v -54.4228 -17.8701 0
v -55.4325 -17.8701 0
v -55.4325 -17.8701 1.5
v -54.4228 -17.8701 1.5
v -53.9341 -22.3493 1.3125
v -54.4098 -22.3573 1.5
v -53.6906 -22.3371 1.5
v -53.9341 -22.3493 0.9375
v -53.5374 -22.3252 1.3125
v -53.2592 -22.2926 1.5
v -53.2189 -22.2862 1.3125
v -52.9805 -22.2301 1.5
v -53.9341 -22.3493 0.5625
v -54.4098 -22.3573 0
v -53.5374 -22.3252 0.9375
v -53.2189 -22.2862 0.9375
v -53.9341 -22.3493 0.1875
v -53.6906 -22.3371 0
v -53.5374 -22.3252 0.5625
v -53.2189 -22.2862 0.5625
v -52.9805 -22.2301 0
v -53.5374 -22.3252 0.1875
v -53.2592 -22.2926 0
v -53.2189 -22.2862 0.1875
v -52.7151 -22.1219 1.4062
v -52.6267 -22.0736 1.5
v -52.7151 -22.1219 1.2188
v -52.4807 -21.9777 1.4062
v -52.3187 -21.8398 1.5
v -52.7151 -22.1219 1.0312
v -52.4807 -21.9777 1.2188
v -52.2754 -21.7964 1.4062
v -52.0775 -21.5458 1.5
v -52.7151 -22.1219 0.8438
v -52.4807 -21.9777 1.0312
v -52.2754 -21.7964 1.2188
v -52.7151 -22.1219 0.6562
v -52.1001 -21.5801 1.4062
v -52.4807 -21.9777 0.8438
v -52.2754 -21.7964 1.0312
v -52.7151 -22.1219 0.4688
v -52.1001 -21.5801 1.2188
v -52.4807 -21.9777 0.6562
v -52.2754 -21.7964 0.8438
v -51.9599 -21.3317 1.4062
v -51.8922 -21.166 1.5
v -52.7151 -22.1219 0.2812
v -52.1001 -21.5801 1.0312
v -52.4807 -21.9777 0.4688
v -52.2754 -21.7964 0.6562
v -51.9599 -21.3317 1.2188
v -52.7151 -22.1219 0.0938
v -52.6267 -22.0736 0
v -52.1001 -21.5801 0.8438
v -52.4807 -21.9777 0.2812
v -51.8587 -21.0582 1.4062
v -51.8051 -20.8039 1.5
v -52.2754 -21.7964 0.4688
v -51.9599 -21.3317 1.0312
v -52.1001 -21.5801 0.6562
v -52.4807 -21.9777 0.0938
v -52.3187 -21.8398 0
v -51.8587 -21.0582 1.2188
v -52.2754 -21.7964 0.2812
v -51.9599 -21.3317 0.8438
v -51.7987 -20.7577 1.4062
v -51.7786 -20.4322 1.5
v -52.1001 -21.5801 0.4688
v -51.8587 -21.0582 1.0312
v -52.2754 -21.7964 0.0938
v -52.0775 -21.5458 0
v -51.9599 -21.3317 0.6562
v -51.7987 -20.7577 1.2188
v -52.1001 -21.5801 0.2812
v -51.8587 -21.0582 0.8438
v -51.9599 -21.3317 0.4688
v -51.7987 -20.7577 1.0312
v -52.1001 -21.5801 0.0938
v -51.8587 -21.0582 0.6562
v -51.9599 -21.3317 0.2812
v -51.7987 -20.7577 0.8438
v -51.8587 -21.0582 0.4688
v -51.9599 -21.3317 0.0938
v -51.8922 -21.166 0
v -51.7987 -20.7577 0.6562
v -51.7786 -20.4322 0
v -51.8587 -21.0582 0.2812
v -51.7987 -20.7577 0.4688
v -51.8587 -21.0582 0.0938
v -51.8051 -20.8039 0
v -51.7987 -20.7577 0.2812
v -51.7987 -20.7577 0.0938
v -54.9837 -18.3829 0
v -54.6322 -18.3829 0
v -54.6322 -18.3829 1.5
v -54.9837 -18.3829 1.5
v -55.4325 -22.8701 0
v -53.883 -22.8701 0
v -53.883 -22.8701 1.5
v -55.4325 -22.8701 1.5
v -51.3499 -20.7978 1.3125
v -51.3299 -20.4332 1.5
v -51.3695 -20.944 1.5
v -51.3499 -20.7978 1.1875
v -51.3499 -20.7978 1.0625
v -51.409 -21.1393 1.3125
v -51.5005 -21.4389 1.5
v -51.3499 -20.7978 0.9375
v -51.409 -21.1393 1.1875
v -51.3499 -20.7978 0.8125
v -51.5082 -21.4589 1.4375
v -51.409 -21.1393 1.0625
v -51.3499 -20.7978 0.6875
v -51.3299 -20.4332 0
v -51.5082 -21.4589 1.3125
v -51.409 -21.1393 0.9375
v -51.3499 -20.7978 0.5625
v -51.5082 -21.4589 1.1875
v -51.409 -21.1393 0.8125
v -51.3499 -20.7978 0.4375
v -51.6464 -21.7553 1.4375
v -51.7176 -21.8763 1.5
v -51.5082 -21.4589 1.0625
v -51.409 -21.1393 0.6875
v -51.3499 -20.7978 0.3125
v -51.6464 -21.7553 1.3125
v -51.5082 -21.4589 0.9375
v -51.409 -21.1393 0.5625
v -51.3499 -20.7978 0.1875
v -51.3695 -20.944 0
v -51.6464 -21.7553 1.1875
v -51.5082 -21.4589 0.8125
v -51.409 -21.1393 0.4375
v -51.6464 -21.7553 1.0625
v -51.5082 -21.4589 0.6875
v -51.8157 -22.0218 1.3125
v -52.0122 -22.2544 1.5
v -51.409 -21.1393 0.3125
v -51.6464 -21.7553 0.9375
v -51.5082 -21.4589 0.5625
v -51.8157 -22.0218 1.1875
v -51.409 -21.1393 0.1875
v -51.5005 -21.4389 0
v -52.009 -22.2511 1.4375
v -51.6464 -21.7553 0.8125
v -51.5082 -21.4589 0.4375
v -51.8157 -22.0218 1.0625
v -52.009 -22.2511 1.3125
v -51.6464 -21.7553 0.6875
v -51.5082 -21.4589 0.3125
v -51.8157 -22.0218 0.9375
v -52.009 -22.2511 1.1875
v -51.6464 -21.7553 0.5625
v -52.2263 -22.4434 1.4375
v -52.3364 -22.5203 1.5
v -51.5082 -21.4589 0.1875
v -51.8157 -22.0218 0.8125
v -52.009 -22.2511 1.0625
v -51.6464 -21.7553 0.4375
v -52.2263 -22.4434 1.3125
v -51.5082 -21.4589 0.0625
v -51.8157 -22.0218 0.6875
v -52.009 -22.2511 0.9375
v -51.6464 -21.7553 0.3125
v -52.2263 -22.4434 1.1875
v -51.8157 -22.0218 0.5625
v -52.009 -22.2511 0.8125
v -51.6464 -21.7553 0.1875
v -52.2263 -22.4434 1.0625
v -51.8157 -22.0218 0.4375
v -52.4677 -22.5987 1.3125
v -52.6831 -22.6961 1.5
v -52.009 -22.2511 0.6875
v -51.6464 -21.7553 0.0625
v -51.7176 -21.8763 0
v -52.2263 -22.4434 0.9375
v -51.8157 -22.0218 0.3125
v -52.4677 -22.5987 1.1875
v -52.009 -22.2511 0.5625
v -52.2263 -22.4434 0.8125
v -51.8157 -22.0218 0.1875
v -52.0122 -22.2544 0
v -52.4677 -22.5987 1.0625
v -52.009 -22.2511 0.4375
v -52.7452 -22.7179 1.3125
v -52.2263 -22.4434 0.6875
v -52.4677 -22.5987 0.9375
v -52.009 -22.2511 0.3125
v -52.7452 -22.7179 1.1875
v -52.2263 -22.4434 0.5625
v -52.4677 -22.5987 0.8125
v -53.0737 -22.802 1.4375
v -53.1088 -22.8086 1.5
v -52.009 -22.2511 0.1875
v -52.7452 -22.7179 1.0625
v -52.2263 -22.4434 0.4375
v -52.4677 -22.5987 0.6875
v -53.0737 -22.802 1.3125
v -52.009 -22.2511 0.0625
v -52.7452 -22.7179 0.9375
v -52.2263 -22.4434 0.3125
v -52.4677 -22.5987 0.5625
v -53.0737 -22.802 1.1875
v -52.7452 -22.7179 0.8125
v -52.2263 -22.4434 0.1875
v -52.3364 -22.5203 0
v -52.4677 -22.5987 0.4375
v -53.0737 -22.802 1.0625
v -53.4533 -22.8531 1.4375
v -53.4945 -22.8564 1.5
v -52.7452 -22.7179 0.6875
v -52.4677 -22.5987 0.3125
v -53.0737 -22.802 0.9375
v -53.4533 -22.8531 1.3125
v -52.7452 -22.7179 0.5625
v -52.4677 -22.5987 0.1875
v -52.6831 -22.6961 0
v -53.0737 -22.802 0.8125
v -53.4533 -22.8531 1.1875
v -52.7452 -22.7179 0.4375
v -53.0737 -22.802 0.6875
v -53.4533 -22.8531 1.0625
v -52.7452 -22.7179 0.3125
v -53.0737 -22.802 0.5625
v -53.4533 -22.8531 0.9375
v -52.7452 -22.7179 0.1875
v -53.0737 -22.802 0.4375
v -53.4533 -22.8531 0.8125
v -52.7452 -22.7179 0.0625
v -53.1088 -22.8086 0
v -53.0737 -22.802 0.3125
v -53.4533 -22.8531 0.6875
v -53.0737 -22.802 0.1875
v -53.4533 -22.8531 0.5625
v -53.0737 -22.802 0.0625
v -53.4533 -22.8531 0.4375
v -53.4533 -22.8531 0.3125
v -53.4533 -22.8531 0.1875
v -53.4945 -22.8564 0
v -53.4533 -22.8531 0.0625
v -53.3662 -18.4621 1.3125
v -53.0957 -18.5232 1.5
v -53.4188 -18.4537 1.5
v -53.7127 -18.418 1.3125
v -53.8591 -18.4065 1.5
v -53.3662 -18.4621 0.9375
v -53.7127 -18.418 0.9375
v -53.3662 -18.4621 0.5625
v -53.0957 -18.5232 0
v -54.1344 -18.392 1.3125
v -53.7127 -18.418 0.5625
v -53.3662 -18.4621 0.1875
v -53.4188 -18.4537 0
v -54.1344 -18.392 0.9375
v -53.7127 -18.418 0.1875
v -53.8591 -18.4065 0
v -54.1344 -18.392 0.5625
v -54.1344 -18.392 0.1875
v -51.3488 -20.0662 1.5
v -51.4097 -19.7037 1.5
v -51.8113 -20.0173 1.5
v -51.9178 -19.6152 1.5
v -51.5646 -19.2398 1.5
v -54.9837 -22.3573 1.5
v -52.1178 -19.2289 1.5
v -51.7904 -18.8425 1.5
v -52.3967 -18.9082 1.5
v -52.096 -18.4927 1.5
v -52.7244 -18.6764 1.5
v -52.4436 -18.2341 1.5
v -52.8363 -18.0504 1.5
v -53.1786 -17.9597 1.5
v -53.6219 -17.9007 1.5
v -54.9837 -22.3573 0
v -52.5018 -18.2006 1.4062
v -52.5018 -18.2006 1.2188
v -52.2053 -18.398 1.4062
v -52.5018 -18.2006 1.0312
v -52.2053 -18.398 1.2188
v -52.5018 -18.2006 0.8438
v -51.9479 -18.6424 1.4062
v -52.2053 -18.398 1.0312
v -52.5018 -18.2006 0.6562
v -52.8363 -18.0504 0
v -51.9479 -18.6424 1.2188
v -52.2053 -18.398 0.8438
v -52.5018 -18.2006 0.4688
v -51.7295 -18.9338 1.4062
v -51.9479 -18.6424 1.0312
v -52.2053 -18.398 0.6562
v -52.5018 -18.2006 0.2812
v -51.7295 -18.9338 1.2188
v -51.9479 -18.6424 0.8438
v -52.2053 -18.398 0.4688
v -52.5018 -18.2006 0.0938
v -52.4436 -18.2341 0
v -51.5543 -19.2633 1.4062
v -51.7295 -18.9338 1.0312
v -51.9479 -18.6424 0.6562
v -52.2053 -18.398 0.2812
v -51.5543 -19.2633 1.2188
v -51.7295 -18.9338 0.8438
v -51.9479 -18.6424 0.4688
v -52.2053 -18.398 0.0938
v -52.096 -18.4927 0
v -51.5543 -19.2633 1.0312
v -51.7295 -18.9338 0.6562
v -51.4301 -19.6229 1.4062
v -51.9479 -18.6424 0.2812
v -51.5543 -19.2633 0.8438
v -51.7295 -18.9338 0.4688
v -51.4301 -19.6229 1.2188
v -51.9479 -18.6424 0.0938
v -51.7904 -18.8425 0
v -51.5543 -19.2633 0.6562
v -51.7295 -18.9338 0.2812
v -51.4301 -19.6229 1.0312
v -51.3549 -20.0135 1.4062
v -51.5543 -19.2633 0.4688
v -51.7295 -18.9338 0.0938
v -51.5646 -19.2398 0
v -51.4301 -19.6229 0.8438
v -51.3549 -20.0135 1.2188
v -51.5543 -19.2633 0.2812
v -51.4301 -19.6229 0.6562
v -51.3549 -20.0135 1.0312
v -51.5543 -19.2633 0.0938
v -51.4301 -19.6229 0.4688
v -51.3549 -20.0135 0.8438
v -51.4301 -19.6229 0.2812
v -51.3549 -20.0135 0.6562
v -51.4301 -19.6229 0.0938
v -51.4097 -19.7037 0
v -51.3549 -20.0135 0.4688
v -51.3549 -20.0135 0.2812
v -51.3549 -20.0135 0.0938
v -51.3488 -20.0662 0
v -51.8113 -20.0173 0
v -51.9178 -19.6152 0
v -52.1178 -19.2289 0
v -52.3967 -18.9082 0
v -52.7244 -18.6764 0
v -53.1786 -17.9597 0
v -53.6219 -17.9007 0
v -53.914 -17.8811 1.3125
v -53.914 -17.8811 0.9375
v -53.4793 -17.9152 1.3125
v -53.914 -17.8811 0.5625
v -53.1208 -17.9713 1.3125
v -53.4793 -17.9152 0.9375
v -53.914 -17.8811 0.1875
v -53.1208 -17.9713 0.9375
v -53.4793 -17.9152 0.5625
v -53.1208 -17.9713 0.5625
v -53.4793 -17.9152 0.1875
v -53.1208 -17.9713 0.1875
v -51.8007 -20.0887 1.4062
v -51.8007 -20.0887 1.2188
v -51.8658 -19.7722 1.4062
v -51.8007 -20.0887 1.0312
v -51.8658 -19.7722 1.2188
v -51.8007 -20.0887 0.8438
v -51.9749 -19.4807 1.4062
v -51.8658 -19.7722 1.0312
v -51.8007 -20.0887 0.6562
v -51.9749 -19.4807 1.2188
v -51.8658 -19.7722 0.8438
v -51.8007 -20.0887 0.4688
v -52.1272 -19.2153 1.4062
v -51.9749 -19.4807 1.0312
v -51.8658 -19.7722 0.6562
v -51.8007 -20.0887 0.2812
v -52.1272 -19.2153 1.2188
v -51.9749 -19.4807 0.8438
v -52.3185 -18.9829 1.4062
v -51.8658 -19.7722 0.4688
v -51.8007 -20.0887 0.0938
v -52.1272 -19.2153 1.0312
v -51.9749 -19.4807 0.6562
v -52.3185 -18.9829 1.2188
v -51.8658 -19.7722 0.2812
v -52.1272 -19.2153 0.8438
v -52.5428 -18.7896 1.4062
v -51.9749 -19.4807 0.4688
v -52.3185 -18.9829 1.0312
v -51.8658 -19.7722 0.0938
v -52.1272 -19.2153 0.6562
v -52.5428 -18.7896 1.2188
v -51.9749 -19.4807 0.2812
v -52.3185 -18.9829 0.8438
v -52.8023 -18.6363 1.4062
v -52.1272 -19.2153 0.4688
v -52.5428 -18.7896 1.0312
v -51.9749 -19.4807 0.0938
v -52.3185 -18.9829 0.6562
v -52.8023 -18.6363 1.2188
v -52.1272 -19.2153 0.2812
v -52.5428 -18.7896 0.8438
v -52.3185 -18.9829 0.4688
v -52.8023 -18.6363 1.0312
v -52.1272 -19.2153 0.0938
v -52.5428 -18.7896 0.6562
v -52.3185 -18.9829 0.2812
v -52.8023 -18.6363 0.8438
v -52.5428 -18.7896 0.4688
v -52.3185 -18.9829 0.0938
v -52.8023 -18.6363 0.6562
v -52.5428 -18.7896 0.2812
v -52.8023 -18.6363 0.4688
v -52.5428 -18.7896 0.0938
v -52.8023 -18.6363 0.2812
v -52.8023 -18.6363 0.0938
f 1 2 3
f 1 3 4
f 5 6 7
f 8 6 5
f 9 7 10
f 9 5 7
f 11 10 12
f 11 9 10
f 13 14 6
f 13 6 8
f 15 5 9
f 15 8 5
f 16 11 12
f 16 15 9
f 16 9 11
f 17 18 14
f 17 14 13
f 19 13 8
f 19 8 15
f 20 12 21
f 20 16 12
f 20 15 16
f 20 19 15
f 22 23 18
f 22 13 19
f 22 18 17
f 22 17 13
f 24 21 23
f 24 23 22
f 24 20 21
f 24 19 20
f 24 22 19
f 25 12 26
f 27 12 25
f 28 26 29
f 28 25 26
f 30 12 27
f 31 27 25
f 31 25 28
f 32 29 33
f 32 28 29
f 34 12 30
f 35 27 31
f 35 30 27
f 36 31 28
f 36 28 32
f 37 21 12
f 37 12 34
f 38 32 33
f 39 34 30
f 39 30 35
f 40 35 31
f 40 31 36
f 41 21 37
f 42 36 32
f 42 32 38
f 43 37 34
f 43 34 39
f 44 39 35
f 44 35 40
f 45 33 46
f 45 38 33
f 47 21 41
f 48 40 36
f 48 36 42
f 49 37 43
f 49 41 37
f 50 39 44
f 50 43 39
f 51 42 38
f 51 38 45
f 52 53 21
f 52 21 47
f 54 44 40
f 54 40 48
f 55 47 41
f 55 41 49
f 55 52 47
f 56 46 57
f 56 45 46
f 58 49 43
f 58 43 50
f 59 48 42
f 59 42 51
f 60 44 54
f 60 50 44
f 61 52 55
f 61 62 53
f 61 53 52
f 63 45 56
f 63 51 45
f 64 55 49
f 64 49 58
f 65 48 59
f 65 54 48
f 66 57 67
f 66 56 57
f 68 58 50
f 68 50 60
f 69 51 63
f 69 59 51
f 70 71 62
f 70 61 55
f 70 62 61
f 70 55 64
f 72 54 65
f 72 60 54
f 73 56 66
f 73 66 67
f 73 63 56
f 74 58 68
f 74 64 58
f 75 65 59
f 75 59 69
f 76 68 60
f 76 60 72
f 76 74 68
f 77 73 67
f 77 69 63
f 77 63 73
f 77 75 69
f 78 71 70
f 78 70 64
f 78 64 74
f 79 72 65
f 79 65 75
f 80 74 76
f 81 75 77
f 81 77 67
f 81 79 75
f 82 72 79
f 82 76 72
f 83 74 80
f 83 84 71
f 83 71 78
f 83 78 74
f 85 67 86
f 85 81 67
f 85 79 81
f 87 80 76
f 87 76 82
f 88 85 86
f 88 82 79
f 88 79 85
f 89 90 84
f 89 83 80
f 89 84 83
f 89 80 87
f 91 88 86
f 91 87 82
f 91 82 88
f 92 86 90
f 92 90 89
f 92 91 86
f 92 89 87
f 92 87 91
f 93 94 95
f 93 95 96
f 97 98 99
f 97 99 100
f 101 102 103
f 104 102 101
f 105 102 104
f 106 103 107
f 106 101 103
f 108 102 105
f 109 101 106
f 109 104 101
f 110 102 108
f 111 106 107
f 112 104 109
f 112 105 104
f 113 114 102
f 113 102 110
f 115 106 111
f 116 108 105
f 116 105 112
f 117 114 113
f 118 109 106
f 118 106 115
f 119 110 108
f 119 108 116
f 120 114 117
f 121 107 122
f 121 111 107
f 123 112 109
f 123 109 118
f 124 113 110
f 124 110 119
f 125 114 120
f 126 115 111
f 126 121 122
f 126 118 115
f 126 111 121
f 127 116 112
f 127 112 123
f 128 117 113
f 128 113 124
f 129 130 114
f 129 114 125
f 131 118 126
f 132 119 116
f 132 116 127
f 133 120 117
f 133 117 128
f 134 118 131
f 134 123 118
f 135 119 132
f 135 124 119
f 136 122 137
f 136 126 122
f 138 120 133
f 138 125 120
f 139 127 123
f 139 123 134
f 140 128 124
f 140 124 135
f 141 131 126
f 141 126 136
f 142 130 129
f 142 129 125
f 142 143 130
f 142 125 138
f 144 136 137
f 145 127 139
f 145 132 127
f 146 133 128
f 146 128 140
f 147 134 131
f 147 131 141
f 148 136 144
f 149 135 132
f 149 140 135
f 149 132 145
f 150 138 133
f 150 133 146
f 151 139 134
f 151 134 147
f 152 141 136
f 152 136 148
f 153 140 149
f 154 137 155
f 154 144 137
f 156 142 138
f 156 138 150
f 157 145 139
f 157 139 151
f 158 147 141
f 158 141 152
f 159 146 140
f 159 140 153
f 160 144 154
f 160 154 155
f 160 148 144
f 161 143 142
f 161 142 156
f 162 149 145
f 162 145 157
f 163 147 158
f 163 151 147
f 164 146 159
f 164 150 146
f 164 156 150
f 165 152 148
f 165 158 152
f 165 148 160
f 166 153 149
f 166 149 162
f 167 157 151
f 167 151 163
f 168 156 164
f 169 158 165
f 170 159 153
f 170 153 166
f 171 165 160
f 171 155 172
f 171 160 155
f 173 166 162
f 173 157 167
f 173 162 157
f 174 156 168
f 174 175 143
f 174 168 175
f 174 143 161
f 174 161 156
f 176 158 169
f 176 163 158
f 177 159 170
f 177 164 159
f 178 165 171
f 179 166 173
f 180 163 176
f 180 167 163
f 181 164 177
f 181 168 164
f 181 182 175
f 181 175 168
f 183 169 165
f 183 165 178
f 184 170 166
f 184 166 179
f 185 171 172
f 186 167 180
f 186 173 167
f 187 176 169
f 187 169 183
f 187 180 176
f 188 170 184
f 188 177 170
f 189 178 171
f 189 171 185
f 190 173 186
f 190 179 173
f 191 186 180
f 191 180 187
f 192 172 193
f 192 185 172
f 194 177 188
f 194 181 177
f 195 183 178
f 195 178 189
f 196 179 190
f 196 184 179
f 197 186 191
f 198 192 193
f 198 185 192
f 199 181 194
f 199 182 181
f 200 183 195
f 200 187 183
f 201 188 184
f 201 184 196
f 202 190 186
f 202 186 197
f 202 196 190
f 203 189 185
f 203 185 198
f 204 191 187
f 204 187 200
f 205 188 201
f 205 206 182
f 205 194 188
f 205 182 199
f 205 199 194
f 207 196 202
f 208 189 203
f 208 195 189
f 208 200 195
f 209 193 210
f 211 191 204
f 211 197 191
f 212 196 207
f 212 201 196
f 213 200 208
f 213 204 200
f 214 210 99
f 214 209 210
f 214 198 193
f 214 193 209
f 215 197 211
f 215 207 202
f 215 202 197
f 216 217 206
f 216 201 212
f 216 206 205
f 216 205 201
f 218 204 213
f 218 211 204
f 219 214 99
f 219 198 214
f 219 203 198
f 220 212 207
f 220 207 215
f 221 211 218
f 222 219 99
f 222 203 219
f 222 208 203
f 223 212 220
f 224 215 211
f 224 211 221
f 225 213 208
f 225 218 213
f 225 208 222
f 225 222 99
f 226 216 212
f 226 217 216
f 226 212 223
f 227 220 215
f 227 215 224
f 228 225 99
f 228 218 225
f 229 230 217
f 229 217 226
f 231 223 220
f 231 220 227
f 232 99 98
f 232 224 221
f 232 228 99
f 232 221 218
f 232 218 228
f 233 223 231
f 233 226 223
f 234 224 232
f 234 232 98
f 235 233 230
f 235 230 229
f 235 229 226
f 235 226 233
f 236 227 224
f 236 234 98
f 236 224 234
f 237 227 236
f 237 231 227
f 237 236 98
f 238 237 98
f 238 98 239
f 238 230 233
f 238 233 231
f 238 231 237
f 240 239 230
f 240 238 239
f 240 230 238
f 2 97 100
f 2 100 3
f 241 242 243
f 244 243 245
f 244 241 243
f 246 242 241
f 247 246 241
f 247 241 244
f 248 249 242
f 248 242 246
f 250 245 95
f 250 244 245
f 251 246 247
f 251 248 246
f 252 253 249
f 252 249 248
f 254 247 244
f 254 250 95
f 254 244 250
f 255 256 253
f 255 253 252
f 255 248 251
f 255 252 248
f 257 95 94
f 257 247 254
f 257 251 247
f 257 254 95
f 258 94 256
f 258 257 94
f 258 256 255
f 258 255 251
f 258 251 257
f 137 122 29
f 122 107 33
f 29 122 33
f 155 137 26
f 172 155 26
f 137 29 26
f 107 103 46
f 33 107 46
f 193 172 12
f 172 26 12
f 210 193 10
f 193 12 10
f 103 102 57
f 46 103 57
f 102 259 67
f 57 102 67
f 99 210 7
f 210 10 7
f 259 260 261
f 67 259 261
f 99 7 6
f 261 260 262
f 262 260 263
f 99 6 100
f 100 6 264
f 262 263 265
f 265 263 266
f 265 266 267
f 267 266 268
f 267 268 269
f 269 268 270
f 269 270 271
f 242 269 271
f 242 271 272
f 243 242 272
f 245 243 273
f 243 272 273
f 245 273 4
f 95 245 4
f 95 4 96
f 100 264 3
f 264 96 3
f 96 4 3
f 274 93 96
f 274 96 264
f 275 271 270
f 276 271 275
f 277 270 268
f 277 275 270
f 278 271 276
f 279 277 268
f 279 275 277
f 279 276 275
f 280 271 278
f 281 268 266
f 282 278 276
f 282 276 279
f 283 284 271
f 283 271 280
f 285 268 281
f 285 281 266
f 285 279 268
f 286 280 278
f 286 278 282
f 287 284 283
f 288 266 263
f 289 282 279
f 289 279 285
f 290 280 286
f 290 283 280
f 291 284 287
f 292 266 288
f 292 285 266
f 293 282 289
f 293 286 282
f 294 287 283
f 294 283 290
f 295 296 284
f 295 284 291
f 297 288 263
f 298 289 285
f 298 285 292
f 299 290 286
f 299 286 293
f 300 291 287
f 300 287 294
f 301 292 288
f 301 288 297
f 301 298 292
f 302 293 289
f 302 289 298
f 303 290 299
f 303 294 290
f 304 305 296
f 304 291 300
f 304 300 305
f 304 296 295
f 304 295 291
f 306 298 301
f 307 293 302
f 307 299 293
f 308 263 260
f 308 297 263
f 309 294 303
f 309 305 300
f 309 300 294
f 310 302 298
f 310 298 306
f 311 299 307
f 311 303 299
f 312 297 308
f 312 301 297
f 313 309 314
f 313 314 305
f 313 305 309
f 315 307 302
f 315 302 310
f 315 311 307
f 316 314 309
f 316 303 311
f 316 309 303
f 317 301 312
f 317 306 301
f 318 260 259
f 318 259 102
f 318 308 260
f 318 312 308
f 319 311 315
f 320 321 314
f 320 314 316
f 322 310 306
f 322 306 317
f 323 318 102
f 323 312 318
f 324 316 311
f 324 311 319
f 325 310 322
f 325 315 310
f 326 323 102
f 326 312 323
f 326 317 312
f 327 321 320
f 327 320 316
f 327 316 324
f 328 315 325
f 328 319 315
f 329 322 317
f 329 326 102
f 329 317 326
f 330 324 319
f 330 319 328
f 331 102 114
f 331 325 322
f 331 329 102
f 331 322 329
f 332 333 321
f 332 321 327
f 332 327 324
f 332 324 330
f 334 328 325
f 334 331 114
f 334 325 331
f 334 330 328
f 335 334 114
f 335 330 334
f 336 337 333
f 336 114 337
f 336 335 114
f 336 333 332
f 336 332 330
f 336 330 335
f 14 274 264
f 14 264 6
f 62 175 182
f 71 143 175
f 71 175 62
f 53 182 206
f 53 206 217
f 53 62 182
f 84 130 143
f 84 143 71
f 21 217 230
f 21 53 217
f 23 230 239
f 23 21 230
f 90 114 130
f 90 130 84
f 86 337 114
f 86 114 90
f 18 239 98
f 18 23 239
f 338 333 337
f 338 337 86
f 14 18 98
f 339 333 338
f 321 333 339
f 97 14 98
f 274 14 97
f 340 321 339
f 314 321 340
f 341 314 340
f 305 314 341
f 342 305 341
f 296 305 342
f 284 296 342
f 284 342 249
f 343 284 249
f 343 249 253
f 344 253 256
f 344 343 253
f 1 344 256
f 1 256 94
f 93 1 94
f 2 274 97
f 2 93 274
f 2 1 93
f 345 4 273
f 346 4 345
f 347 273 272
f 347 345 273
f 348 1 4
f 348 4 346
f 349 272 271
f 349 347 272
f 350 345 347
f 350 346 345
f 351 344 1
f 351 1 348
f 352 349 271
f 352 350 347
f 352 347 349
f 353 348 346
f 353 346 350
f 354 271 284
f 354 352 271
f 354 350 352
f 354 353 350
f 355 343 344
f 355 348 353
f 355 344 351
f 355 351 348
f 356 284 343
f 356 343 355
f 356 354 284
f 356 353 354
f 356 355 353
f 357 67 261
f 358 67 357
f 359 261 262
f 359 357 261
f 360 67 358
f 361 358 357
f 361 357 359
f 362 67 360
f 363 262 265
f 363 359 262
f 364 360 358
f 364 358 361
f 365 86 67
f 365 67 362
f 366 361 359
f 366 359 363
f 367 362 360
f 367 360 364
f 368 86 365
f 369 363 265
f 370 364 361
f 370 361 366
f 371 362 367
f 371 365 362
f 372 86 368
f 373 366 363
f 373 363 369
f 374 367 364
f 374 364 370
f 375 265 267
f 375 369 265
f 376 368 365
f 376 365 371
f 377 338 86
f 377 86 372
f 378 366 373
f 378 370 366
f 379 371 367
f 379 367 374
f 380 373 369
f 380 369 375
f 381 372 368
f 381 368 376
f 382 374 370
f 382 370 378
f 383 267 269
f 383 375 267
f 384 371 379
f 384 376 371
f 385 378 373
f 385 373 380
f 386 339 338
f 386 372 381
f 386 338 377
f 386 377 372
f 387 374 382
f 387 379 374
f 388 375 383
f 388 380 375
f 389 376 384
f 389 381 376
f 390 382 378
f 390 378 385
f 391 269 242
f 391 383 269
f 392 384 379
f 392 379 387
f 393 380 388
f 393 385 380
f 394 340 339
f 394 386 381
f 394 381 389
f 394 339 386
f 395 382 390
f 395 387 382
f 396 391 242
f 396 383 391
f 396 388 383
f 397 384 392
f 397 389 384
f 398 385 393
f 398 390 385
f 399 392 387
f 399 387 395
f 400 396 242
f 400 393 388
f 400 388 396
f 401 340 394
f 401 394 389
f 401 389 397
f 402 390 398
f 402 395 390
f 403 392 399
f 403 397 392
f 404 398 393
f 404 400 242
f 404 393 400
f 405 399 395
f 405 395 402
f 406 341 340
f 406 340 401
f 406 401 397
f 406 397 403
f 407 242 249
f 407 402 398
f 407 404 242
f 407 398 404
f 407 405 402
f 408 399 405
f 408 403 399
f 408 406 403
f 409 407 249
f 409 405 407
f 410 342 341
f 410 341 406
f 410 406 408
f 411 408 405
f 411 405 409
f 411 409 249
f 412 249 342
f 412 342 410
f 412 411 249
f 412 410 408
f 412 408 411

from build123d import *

# Parameters (mm, degrees)
BOSS_EXTRU_1_DEPTH = 1.5


with BuildPart() as part:
    # Esquisse1 → Boss.-Extru.1 (new body)
    with BuildSketch(Plane.XY):
        with BuildLine():
            Line((-55.432465326, -22.870119076), (-55.432465326, -17.870119076))
            Line((-55.432465326, -17.870119076), (-54.422849941, -17.870119076))
            add(Edge.make_bspline(
                [(-54.422849941, -17.870119076), (-54.335037101, -17.870751319), (-54.165383151, -17.871972809), (-53.920222511, -17.879717653), (-53.693388565, -17.893418319), (-53.485627338, -17.913374785), (-53.296368463, -17.937879119), (-53.12614188, -17.968593982), (-52.974067391, -18.004862797), (-52.880539618, -18.035784869), (-52.83631148, -18.050407538)],
                knots=[0, 0, 0, 0, 1.314313732, 2.53924729, 3.670748893, 4.714932338, 5.66265055, 6.526160246, 7.303039223, 8, 8, 8, 8], degree=3))
            add(Edge.make_bspline(
                [(-52.83631148, -18.050407538), (-52.778461852, -18.072451403), (-52.664074435, -18.116039252), (-52.501207117, -18.198262539), (-52.34788517, -18.291424113), (-52.203286391, -18.395646774), (-52.070713782, -18.513881558), (-51.944988215, -18.641105966), (-51.831252896, -18.781946452), (-51.727098187, -18.933482149), (-51.633190102, -19.093927938), (-51.551562734, -19.262978093), (-51.483771315, -19.439774105), (-51.427495277, -19.623824316), (-51.383143194, -19.815533427), (-51.352883292, -20.015124664), (-51.332924735, -20.221809221), (-51.330918947, -20.362058455), (-51.329901223, -20.433220038)],
                knots=[0, 0, 0, 0, 0.984719456, 1.947108742, 2.898477687, 3.838006223, 4.779231079, 5.722358779, 6.681677486, 7.655904652, 8.64651281, 9.637519902, 10.640069247, 11.656948941, 12.698408672, 13.768548281, 14.867775369, 16, 16, 16, 16], degree=3))
            add(Edge.make_bspline(
                [(-51.329901223, -20.433220038), (-51.330799748, -20.495021807), (-51.332570386, -20.616808648), (-51.348469408, -20.796295642), (-51.371578437, -20.970457887), (-51.407355862, -21.13846603), (-51.450788024, -21.301792055), (-51.506451098, -21.458695262), (-51.570216092, -21.610614989), (-51.644573062, -21.755497098), (-51.726203612, -21.892759058), (-51.813806102, -22.02215267), (-51.907287095, -22.141831558), (-52.007537999, -22.252158147), (-52.113263309, -22.352966116), (-52.225155209, -22.445097566), (-52.343502425, -22.526749787), (-52.467774886, -22.601131371), (-52.601597928, -22.666017593), (-52.747506308, -22.720917607), (-52.906122277, -22.766412772), (-53.077056501, -22.804371194), (-53.260604326, -22.834481627), (-53.456945706, -22.854662187), (-53.665778977, -22.868309234), (-53.809177927, -22.869504082), (-53.882986159, -22.870119076)],
                knots=[0, 0, 0, 0, 1.105936401, 2.179363191, 3.223086493, 4.248585256, 5.251745608, 6.245858792, 7.225916811, 8.198733463, 9.158002045, 10.082870192, 10.993790845, 11.873723703, 12.748670949, 13.606408763, 14.465103618, 15.319838547, 16.196477973, 17.123216899, 18.106603292, 19.147568657, 20.255746949, 21.433717677, 22.679120308, 24, 24, 24, 24], degree=3))
            Line((-53.882986159, -22.870119076), (-55.432465326, -22.870119076))
        make_face()
        with BuildLine():
            Line((-54.983747377, -22.357298563), (-54.409829108, -22.357298563))
            add(Edge.make_bspline(
                [(-54.409829108, -22.357298563), (-54.327360007, -22.35694414), (-54.168741723, -22.356262454), (-53.94065887, -22.350280735), (-53.732259732, -22.340506539), (-53.543514719, -22.326827856), (-53.374530398, -22.308729835), (-53.224953613, -22.288551402), (-53.095274672, -22.263412187), (-53.016804048, -22.240625102), (-52.980542249, -22.230095038)],
                knots=[0, 0, 0, 0, 1.375205317, 2.645023457, 3.804390687, 4.853969522, 5.800190428, 6.637939096, 7.370582563, 8, 8, 8, 8], degree=3))
            add(Edge.make_bspline(
                [(-52.980542249, -22.230095038), (-52.934901732, -22.214021383), (-52.84471082, -22.182257993), (-52.714880698, -22.124318477), (-52.593799263, -22.055686949), (-52.47935637, -21.979397986), (-52.373175433, -21.89276084), (-52.273998124, -21.797659427), (-52.182024123, -21.693609749), (-52.098203683, -21.580740947), (-52.02319182, -21.459755524), (-51.95823292, -21.331842905), (-51.901302161, -21.198404604), (-51.856618457, -21.057391521), (-51.821596194, -20.910064294), (-51.796789497, -20.756412561), (-51.781339891, -20.596465016), (-51.779537822, -20.487676267), (-51.778619172, -20.432218435)],
                knots=[0, 0, 0, 0, 0.998632004, 1.973411704, 2.929992603, 3.868527914, 4.809262121, 5.754881198, 6.702106254, 7.672490631, 8.653608572, 9.636854334, 10.631411391, 11.644891563, 12.686317036, 13.754757253, 14.855430412, 16, 16, 16, 16], degree=3))
            add(Edge.make_bspline(
                [(-51.778619172, -20.432218435), (-51.77935244, -20.373742035), (-51.780792951, -20.258864629), (-51.798899108, -20.090306492), (-51.825358473, -19.928191277), (-51.863620882, -19.772508141), (-51.91237928, -19.622953352), (-51.973228768, -19.480354052), (-52.04275251, -19.343204239), (-52.125471563, -19.214669431), (-52.216065268, -19.093107847), (-52.316605095, -18.981743682), (-52.425493722, -18.880323253), (-52.541543507, -18.787267092), (-52.668025077, -18.706318983), (-52.801958921, -18.633909439), (-52.94530988, -18.572458165), (-53.045042303, -18.539774076), (-53.095726544, -18.523163948)],
                knots=[0, 0, 0, 0, 1.122418816, 2.205001699, 3.251619955, 4.274784885, 5.280384055, 6.268708349, 7.249350384, 8.229342522, 9.199999885, 10.157847722, 11.105861043, 12.055065948, 13.010012805, 13.98527497, 14.976112212, 16, 16, 16, 16], degree=3))
            add(Edge.make_bspline(
                [(-53.095726544, -18.523163948), (-53.137656753, -18.511569051), (-53.226811882, -18.486915119), (-53.372296831, -18.46002173), (-53.536032758, -18.436301017), (-53.718746617, -18.416218103), (-53.92023013, -18.401807644), (-54.140638256, -18.39099148), (-54.380066262, -18.383696291), (-54.546041311, -18.383198138), (-54.632184877, -18.382939589)],
                knots=[0, 0, 0, 0, 0.674548936, 1.434276114, 2.292660221, 3.240891867, 4.284742987, 5.42552168, 6.663806718, 8, 8, 8, 8], degree=3))
            Line((-54.632184877, -18.382939589), (-54.983747377, -18.382939589))
            Line((-54.983747377, -18.382939589), (-54.983747377, -22.357298563))
        make_face(mode=Mode.SUBTRACT)
    extrude(amount=BOSS_EXTRU_1_DEPTH)


solid = part.part
